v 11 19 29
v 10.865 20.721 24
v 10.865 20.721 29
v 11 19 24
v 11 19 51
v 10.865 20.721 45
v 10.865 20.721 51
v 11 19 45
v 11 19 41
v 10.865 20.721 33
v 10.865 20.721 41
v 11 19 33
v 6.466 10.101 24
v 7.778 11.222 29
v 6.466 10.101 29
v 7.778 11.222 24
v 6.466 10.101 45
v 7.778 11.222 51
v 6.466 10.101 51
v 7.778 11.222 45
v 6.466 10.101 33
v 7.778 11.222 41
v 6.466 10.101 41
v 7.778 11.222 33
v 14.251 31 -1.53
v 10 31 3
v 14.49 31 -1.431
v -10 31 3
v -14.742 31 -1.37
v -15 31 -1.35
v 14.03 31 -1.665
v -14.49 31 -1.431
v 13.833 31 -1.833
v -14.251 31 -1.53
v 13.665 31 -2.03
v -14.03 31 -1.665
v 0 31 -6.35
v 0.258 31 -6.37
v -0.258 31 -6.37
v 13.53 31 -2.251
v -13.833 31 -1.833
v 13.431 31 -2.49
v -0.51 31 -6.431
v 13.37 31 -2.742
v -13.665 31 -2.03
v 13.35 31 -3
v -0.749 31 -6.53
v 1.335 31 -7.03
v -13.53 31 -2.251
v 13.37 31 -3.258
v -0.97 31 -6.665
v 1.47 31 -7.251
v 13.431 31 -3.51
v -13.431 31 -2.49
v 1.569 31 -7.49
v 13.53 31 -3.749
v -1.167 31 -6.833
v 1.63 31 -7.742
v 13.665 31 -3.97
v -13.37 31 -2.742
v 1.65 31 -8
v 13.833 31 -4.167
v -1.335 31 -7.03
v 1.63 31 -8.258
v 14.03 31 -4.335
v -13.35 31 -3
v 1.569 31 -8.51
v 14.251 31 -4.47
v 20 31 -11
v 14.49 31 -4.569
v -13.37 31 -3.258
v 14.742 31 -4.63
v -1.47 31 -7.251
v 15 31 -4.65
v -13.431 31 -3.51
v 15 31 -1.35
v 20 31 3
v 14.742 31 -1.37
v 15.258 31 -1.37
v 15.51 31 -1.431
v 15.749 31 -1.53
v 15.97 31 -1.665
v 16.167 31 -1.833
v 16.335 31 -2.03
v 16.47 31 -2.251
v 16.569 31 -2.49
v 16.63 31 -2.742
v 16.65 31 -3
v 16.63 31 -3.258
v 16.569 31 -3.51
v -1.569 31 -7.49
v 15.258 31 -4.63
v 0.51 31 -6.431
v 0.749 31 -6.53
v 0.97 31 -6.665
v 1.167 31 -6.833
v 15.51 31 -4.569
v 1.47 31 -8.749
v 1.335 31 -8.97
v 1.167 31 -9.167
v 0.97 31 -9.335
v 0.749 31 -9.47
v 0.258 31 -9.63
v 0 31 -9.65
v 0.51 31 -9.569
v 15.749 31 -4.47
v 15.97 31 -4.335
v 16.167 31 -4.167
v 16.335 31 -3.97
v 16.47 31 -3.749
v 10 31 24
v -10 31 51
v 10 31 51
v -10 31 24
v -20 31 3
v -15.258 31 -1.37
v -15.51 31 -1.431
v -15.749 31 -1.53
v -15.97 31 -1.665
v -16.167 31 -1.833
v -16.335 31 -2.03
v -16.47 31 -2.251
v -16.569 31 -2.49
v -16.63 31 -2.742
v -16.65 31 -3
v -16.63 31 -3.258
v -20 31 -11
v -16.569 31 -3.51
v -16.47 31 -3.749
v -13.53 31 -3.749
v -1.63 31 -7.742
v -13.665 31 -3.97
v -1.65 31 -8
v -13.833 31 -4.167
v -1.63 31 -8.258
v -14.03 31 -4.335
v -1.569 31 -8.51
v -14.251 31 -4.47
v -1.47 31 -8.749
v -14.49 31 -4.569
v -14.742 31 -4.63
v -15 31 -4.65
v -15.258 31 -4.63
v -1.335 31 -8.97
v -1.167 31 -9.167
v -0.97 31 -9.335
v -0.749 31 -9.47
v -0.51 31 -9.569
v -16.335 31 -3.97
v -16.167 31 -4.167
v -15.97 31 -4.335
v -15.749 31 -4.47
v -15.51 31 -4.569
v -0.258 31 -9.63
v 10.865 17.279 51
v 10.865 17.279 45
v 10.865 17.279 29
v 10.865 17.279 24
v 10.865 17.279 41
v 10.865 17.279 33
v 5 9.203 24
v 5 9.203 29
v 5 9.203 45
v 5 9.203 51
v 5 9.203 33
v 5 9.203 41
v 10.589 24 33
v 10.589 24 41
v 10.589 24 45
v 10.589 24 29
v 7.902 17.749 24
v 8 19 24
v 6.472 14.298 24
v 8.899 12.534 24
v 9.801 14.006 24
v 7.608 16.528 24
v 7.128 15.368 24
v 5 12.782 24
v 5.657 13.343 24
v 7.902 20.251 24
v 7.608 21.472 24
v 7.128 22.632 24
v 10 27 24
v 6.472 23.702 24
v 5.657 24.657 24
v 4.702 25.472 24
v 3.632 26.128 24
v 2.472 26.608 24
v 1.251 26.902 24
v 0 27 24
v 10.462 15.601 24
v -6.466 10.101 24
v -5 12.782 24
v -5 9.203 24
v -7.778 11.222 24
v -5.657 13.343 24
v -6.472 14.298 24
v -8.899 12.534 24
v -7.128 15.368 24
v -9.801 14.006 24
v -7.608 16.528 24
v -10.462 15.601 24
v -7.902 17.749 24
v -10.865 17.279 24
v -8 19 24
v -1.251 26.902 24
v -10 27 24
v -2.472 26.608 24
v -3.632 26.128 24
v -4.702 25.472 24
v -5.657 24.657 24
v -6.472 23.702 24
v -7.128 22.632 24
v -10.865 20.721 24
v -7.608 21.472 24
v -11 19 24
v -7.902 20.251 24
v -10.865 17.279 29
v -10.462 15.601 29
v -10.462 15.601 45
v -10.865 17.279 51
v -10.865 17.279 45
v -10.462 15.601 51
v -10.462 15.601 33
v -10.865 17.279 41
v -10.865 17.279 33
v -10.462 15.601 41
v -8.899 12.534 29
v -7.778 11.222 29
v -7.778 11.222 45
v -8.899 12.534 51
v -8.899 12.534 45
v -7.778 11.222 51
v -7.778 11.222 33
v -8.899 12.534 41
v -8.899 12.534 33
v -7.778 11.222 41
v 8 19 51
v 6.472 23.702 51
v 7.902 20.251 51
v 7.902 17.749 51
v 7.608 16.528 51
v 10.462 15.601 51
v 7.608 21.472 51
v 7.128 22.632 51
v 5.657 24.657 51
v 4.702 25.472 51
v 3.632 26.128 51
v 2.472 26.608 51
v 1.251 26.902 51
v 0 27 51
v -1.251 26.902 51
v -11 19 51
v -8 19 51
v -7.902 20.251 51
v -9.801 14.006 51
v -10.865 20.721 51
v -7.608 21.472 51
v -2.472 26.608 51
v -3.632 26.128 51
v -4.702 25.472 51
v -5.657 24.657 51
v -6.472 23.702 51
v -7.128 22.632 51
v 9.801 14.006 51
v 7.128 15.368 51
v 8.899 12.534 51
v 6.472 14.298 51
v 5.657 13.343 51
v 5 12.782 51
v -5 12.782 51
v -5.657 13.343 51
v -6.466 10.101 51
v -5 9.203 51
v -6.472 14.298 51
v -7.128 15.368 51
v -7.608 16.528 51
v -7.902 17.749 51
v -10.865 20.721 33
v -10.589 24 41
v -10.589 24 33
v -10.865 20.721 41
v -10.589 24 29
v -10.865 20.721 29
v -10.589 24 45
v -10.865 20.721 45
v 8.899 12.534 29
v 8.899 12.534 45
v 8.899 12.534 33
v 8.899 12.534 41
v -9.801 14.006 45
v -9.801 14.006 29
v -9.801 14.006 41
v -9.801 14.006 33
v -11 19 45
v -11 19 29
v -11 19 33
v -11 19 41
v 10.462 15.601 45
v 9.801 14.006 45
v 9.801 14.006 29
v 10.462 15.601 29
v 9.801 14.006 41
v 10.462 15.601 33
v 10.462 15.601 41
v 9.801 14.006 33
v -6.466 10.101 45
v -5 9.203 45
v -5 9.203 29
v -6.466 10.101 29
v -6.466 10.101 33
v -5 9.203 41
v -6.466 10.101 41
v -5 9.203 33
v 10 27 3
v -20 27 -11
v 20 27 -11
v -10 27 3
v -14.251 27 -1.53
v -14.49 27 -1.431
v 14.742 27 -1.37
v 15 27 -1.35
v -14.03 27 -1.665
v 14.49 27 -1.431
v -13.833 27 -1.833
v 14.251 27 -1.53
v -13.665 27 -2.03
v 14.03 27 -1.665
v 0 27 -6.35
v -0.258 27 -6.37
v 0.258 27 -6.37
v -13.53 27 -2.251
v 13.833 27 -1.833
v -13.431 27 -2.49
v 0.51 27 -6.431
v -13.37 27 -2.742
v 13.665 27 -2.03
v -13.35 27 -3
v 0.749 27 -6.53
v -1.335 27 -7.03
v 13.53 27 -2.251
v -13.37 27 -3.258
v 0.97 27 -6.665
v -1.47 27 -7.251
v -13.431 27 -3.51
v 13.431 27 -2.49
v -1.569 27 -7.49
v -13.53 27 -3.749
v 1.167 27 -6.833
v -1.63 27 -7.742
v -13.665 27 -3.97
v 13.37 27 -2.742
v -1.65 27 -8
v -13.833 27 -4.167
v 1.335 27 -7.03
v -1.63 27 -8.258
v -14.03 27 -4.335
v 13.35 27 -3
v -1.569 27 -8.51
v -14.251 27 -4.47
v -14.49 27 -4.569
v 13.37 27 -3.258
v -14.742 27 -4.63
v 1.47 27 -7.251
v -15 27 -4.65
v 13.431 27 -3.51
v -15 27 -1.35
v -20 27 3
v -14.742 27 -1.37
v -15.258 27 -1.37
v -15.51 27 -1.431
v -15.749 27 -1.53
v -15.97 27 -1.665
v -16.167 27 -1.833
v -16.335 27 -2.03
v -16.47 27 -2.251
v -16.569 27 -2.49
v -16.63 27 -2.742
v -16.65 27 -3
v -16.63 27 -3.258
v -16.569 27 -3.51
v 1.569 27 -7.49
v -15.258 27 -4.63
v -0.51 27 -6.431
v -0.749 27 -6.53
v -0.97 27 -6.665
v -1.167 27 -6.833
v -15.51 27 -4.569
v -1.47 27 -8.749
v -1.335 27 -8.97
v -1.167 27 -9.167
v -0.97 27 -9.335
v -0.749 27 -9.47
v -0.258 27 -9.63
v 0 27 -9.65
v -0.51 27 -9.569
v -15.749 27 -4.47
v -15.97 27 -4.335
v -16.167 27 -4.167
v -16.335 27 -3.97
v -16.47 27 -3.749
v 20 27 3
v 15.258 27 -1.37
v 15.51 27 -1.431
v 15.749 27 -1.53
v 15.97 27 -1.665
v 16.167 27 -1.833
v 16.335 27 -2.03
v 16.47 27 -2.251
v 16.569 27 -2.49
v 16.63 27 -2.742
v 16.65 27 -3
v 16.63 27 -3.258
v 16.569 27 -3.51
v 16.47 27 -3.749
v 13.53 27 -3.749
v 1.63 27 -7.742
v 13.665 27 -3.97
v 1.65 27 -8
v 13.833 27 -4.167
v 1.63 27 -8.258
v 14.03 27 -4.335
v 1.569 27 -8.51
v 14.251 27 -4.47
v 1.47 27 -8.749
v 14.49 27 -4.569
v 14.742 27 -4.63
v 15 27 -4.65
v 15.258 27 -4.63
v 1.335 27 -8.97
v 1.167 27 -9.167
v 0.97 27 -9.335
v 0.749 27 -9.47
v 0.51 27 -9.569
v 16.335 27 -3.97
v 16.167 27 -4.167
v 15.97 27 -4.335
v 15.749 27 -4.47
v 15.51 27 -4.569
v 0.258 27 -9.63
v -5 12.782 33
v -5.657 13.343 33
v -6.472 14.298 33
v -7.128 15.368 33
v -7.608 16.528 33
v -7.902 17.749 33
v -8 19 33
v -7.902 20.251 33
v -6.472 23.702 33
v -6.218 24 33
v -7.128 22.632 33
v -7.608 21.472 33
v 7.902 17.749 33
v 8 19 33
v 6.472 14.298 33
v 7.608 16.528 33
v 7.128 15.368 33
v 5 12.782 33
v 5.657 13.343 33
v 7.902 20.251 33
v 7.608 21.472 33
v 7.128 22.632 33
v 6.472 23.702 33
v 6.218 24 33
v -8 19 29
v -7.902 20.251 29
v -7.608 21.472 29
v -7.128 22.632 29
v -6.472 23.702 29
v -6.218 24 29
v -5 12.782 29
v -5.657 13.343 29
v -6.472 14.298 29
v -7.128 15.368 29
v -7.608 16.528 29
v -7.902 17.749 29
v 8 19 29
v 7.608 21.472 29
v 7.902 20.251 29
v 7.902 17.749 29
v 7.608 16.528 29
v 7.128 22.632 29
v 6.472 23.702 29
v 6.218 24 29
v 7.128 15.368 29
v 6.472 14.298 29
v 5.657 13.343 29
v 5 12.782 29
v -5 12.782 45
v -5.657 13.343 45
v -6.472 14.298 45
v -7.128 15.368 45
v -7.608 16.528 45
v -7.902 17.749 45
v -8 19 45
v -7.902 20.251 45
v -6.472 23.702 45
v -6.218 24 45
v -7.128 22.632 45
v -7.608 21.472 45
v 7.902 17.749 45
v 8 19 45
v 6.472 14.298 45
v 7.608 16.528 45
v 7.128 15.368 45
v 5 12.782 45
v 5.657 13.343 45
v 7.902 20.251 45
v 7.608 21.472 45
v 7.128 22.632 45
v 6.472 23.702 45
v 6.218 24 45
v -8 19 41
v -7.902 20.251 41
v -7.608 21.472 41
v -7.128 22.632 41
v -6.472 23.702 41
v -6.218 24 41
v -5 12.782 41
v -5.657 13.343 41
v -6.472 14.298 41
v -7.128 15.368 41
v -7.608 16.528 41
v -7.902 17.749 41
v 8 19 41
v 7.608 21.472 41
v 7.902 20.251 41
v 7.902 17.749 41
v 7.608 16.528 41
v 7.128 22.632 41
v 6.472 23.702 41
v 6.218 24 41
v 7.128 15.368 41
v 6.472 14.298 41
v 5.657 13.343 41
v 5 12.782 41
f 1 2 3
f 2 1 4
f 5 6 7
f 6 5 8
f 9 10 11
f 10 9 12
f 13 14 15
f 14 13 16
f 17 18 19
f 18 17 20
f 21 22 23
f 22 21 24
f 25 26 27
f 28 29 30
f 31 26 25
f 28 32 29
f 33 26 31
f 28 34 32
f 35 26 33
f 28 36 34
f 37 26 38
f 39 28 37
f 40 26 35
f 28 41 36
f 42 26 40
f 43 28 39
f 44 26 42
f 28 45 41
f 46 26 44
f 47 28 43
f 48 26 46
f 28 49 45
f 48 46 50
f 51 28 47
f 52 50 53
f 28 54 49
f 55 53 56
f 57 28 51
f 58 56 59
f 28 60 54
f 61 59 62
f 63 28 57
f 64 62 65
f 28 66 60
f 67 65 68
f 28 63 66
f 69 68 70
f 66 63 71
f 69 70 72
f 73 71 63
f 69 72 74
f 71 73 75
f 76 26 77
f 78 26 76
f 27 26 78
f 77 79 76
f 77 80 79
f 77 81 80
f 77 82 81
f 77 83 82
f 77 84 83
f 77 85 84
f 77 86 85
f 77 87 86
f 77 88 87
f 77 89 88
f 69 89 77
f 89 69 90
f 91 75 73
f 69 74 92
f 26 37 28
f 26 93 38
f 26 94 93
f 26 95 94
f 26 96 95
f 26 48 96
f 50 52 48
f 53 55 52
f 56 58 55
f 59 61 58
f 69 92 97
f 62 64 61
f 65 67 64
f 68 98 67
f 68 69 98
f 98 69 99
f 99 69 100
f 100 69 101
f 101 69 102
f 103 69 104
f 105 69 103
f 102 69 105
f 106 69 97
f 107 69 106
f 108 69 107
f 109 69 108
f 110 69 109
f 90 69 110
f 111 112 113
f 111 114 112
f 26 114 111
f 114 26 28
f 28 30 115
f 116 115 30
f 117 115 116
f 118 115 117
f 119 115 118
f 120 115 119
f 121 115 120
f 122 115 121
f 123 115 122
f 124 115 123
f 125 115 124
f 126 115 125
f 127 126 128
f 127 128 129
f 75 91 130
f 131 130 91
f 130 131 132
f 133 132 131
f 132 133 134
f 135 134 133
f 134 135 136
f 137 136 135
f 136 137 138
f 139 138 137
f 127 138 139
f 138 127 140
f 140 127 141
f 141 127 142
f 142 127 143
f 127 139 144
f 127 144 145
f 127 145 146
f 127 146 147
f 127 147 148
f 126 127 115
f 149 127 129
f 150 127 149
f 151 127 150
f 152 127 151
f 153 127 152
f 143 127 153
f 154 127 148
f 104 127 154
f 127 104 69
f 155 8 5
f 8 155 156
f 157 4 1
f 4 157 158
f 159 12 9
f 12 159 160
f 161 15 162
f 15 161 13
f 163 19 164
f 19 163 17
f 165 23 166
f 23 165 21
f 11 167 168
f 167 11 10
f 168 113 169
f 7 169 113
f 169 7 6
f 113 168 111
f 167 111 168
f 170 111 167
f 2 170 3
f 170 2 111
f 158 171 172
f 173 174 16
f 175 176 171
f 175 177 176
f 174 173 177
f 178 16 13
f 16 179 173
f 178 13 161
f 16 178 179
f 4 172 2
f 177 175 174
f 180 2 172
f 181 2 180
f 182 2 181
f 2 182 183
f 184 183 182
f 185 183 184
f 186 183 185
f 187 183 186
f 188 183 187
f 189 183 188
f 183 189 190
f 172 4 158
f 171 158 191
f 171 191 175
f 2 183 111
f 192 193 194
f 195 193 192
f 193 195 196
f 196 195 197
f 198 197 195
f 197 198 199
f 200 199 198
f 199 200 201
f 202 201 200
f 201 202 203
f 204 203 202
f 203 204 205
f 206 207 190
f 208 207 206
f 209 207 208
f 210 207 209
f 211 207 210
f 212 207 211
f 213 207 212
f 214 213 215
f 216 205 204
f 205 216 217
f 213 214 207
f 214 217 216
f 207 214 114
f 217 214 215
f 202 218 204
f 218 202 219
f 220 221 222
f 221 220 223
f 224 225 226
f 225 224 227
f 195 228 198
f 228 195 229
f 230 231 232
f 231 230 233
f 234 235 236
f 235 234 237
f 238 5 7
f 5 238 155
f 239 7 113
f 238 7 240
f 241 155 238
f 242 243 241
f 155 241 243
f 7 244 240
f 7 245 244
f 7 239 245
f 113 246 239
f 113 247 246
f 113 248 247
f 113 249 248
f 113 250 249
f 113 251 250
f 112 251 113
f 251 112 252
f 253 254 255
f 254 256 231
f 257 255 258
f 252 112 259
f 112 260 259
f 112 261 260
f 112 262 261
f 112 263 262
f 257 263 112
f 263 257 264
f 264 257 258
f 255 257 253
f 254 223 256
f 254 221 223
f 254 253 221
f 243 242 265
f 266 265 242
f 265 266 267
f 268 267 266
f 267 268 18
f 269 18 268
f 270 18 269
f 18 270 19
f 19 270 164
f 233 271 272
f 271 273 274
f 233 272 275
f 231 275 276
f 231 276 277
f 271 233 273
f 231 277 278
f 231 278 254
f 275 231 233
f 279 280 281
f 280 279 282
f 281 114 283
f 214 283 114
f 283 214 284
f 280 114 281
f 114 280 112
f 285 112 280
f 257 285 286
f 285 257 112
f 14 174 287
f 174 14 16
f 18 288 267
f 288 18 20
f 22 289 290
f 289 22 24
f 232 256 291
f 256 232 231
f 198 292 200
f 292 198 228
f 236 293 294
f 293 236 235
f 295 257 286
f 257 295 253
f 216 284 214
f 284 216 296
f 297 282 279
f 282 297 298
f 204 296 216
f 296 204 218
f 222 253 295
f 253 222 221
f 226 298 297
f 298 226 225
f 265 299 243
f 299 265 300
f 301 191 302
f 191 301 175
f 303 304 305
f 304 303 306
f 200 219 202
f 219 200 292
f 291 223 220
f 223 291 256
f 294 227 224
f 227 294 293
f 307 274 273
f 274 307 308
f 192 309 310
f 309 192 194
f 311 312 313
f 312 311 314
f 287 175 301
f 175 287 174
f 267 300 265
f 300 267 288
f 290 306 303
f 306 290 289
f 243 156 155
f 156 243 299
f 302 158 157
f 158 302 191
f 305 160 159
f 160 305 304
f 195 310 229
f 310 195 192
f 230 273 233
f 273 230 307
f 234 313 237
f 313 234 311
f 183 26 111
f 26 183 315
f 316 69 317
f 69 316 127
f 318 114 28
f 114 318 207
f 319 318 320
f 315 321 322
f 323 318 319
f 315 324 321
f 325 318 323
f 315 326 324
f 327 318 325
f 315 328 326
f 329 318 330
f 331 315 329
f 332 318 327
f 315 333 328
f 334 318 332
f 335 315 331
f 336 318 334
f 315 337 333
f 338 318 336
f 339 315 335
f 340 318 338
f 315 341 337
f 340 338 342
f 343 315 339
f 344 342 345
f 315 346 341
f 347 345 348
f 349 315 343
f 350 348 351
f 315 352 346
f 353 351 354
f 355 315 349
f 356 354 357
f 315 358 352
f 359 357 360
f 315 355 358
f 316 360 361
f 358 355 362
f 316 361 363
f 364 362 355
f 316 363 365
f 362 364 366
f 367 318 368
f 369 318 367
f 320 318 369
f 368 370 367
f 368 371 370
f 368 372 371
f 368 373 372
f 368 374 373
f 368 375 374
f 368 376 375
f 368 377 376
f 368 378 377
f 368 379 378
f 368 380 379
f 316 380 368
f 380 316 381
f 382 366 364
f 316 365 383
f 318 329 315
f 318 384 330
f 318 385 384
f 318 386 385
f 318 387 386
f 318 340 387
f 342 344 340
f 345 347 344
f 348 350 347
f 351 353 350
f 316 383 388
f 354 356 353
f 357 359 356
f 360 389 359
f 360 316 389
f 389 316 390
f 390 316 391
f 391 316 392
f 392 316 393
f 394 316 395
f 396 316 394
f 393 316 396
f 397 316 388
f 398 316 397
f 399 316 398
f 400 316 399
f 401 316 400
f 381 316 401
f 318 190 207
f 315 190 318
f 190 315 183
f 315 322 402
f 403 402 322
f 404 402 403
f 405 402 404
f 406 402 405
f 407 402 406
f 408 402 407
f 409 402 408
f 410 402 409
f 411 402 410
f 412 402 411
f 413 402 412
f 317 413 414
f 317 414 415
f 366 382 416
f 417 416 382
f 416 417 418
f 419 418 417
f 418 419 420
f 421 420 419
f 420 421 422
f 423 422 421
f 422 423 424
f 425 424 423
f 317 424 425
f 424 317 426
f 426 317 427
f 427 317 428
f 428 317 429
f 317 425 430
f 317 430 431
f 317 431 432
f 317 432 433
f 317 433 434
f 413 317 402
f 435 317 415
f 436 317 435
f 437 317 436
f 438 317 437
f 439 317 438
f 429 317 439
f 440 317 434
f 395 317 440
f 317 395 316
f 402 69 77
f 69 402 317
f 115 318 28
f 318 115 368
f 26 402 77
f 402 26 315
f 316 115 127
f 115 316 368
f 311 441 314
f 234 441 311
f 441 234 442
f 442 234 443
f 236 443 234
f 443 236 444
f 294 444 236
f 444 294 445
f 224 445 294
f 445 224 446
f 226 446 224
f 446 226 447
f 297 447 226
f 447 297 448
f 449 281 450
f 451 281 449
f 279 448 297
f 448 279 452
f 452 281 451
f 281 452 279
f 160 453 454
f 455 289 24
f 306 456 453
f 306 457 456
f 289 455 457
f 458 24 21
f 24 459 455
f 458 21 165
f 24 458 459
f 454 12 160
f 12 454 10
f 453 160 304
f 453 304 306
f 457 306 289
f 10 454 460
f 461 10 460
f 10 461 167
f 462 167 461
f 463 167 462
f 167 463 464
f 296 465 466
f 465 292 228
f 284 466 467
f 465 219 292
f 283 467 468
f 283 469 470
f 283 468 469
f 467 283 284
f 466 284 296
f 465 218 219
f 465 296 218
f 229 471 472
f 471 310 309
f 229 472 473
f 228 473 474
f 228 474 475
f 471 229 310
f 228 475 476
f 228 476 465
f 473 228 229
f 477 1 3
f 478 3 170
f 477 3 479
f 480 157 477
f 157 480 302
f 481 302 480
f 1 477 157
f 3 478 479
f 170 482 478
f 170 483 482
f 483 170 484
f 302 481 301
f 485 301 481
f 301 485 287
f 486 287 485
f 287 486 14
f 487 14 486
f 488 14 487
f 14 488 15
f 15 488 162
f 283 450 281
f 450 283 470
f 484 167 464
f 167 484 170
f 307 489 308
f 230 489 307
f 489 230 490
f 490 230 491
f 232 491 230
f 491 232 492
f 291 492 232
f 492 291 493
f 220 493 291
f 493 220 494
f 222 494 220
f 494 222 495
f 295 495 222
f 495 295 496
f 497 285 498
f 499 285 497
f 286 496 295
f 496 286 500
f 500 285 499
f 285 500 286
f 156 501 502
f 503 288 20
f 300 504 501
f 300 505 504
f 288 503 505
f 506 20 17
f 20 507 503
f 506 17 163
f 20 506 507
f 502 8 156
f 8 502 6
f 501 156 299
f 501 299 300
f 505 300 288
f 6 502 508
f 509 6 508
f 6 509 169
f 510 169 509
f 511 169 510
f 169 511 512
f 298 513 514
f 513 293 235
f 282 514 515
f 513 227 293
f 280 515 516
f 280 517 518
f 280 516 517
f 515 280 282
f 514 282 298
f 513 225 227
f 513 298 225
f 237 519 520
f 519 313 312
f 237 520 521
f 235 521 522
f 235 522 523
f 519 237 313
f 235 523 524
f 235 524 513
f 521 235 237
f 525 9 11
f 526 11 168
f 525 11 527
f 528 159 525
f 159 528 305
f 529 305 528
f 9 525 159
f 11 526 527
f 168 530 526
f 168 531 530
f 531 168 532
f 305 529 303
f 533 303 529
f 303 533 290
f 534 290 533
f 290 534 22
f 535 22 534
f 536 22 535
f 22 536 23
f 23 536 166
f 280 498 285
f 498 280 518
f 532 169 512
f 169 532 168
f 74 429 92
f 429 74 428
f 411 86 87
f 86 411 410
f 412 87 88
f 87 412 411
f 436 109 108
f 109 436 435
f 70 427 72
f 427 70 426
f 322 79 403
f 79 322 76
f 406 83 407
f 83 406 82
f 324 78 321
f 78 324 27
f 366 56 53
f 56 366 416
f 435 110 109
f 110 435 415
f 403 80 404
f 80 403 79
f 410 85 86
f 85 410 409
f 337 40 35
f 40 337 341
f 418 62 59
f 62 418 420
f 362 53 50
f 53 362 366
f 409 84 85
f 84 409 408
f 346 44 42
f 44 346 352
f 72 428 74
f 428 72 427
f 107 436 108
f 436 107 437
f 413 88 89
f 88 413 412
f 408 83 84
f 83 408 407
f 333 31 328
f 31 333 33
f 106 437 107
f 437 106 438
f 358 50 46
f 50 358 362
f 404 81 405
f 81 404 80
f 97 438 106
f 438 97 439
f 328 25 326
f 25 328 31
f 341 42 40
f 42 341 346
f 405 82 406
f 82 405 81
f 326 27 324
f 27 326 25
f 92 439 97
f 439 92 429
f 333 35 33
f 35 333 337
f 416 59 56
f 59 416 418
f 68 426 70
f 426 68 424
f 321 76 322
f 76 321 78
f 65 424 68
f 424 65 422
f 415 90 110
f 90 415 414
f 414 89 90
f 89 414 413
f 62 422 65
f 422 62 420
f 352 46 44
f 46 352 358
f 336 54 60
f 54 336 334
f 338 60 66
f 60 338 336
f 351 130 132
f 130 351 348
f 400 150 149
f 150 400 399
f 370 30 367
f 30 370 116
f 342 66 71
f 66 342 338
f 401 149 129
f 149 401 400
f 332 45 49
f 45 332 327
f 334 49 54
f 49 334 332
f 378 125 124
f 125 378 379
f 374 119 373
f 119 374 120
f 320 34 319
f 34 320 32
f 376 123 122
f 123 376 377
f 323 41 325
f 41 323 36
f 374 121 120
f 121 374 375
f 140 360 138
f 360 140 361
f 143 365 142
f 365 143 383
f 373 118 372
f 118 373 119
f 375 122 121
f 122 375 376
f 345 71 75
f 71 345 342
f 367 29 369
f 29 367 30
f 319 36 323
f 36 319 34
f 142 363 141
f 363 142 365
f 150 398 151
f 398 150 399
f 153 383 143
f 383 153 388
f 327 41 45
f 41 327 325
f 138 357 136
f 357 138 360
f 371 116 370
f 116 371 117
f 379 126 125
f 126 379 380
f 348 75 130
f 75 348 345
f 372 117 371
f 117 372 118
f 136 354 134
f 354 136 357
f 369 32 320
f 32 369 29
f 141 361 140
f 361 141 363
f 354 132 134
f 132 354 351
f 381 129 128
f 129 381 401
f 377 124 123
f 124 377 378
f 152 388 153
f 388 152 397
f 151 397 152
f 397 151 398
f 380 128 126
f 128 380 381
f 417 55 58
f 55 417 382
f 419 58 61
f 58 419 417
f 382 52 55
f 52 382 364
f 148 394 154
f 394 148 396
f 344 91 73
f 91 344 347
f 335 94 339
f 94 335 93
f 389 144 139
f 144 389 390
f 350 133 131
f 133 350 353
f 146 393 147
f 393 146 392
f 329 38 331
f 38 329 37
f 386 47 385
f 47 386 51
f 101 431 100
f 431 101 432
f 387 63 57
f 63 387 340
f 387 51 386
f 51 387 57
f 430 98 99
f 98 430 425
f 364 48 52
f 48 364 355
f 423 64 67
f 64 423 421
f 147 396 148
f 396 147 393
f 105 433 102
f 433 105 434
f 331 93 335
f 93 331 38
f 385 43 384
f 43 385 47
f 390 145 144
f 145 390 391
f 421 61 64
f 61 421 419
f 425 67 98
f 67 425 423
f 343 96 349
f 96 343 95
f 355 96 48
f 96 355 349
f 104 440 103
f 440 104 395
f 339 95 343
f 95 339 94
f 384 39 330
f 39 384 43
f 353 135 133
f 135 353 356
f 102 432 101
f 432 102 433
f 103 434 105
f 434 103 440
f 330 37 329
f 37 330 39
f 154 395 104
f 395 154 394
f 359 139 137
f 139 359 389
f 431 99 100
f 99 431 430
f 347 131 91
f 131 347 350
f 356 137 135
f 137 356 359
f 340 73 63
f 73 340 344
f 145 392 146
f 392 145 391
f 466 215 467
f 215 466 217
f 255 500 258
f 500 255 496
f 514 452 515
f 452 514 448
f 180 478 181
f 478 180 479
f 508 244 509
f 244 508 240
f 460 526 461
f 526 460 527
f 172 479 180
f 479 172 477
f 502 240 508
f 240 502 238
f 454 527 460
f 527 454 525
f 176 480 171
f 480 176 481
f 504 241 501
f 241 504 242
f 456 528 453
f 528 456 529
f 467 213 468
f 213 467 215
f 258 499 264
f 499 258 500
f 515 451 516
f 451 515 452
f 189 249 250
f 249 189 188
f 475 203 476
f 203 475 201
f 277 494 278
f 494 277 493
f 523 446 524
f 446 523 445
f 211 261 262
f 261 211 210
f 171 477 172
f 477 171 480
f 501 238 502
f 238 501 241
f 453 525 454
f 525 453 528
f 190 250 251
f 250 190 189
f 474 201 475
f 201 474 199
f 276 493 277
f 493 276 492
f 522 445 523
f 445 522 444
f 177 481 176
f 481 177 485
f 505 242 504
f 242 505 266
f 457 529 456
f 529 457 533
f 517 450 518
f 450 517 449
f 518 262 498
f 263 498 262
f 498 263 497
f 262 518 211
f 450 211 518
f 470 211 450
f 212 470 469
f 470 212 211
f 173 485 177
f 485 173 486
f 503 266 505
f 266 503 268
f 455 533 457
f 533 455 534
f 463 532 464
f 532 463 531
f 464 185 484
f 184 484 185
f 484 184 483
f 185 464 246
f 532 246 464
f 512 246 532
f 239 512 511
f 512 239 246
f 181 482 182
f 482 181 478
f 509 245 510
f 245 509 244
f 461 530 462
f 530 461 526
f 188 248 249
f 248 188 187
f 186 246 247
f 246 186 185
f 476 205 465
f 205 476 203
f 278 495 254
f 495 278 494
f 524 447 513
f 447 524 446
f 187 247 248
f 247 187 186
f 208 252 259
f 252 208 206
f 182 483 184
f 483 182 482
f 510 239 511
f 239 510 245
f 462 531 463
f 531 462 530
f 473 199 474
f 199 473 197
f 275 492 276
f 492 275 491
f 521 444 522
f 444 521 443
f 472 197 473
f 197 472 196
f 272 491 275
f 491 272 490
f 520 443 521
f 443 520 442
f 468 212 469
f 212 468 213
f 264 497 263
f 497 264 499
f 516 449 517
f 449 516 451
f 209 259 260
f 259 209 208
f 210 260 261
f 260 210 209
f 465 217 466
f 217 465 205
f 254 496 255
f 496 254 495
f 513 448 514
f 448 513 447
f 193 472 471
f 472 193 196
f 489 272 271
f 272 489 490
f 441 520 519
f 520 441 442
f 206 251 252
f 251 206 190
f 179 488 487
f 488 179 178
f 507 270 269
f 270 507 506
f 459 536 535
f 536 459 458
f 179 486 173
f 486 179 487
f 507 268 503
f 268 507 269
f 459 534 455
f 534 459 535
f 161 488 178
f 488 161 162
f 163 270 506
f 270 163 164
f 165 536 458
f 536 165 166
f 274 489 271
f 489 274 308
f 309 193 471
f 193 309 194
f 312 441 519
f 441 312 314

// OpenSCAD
/*
    Sorry this is quite a bit of a mess, and is carried over from a prior design
*/

// Belt Offsets as calculated from the center of X MGN12 block
EVAFrontBeltY = 15.5;

// Center of the belt offset as calculated from the center top of the MGN12 block
EVAFrontUpperBeltZ = -18;
EVAFrontLowerBeltZ = -30;

// Center of the belt offset as calculated from the center top of the MGN12 block
EVAFrontUpperBeltX = 17;
EVAFrontLowerBeltX = -26;

// Belt Offsets as calculated from the X block
EVABackBeltY = -16.5;

EVABackLowerBeltZ = -30;
EVABackUpperBeltZ = -18;

EVABackLowerBeltX = 20;
EVABackUpperBeltX = -27;

module bl_touch_mount_holes(){
	translate([0,-38-9.2,-17]){
		for(x=[0,35.4]){
			translate([0,34,x]) rotate([0,90,0]) cylinder(r=3.5/2,h=100,center=true);
            translate([0,34,0]) rotate([0,90,0]) cylinder(r=6.1/2,h=49,center=true,$fn=6.05);
		}
	}
}

/*

translate([0,0,-38]) rotate([90,0,0]) {
translate([0,16,0]) color("black") cube([100,20,20],center=true);
                   color("red") translate([0,32,0]) cube([100,12,25],center=true);

}*/


module mount() {
    
    difference(){
        union(){
            translate([0,-21,-13]) cylinder(r=10/2,h=21);
            translate([0,0,-38]) rotate([90,0,0]) difference(){
                
                //Main block
                union(){
                    translate([0,1.5,-3.5+1]) cube([58,86+3,42+9],center=true);
                
                    
                    translate([0,1.5,-42/2]) difference(){
                        cube([56,86,7],center=true);
                    }
                }
                
                color("grey") lgx_screw_holes();

                fan_holes(2.5);
                
                // Screw holes for mounts
                for(x=[-25,25]){
                    for(y=[7,-69]){
                        translate([x,35+y,25]) cylinder(r=3.4/2,h=190,center=true);
                        translate([x,35+y,-65]) cylinder(r=6.05/2,h=90,center=true,$fn=6);
                    }
                }
                
                // Screw holes for cable mounts
                for(x=[-15,15]){
                    for(y=[7,-69]){
                        translate([x,35+y,-25]) cylinder(r=2.9/2,h=20,center=true);
                    }
                }
                translate([0,35+7-5,-25]) cylinder(r=2.9/2,h=20,center=true);

                
                // Cut out for the rail and slider
                translate([0,32,0]) cube([100,12,29],center=true);
                translate([0,05,0]) cube([100,53,22],center=true);


                // Cut out for the stepper motor
                translate([0,-23,0]) cube([42,50,43],center=true);
                
                // Cut out for rear stepper cables
                translate([0,-20,-12]) cube([26,64,19],center=true);
                
                // Cut out for rear stepper cables
                translate([0,-20,-22]) cube([15,64,19],center=true);
                
                // Cut out for front handle
                translate([0,-10,20]) cube([42,70,50],center=true);
                
                
                // Mounts for the stepper motor
                bl_touch_mount_holes();
                
                //Slide rail mounts
                for(x=[-10,10]){
                    for(z=[-10,10]){
                        translate([x,40,z]) rotate([90,0,0]) cylinder(r=3.3/2,h=20,center=true);
                    }
                }     
            }
 
           
            translate([EVABackUpperBeltX,-EVABackBeltY,EVABackUpperBeltZ]) translate([11,5.6,0]){
                cube([25,17,14],center=true); 
            }
            translate([EVABackLowerBeltX,-EVABackBeltY,EVABackLowerBeltZ]) translate([1,5.6,0]) {
                cube([25,17,14],center=true);
            }
        }
        
        translate([EVABackUpperBeltX,-EVABackBeltY,EVABackUpperBeltZ]) translate([10,5.6,0]){
            cube([25,14,12],center=true); 
            translate([0,2,0]) rotate([0,90,0]) cylinder(r=5.5/2,h=200,center=true);
        }
        translate([EVABackLowerBeltX,-EVABackBeltY,EVABackLowerBeltZ]) translate([2,5.6,0]) {
            cube([25,14,12],center=true);
            translate([0,2,0]) rotate([0,90,0]) cylinder(r=5.5/2,h=200,center=true);
        }
        
        // Front belt mounts
        translate([EVAFrontLowerBeltX-2.5,-EVAFrontBeltY,EVAFrontLowerBeltZ]) rotate([0,0,-90])  gt2_belt(); 
        
        translate([EVAFrontUpperBeltX+11.5,-EVAFrontBeltY-12,
        EVAFrontUpperBeltZ]) rotate([0,0,90]) gt2_belt();
        
       
      
        translate([EVAFrontLowerBeltX+1,-EVAFrontBeltY,EVAFrontLowerBeltZ]) {
            rotate([90,0,90]) for(z=[-7,7]){
                translate([-4,z,-5]) rotate([0,0,0]) cylinder(r=2.9/2,h=10,center=true);
            }
        }
        
        translate([EVAFrontUpperBeltX+8,-EVAFrontBeltY,EVAFrontUpperBeltZ]) rotate([90,0,90]) {
            
            for(z=[-7,7]){
                translate([-4,z,5]) cylinder(r=2.9/2,h=10,center=true);
            }
        }
        
        mirror([1,0,0]) rotate([90,0,0]) translate([0,-38,0]) fan();
   
     
        //filament tube hole
        translate([0,-21,-14]) cylinder(r=6/2,h=24);
        
        // front duct mount
        translate([0,-17,-76]) rotate([0,90,0]) cylinder(r=3.2/2,h=100,center=true);
        translate([0,-17,-76]) rotate([0,90,0]) cylinder(r=6.1/2,h=49,center=true,$fn=6.05);


    }
    

   
}


module mount_a(){
    intersection(){
        translate([0,-100,0]) cube([200,200,200],center=true);
        mount();
    }
}

module mount_b(){
    intersection(){
        translate([0,100,0]) cube([200,200,200],center=true);
        mount();
    }
}






module cable_mount(){
    translate([0,29,9]){
        difference(){
            union(){
                hull(){
                    translate([0,-10,15]) cylinder(r=22/2,h=27);
                    translate([0,0,28.5]) cube([20,4,27],center=true);
                }
                translate([0,0,11]) cube([20,4,62],center=true);
                translate([0,0,-13]) cube([40,4,14],center=true);

            }
            //translate([0,-13,25]) cylinder(r=16/2,h=50,center=true);
            translate([0,-10,25]) cylinder(r=16/2,h=50,center=true);

            for(z=[0:12:25]){
                translate([0,-17,22+z]) cube([24,24,4],center=true);
            }
            
            translate([0,-17,29]) cube([10,10,40],center=true);

            


        translate([0,0,-12]){
        for(z=[15,-15]){
            translate([z,0,0]) rotate([90,0,0]) cylinder(r=3.3/2,h=560,center=true);
        }   
        translate([0,0,-5]) rotate([90,0,0]) cylinder(r=3.3/2,h=560,center=true);

    }
    }
    }
}



module belt_mount(){
    difference(){
    union(){
      translate([EVAFrontLowerBeltX+1,-EVAFrontBeltY,EVAFrontLowerBeltZ]) translate([-6,-4.5,0]) cube([4,6,20],center=true);
    
    translate([EVAFrontLowerBeltX+1,-EVAFrontBeltY,EVAFrontLowerBeltZ]) translate([-6,-6.5,0]){
            rotate([90,0,90]) for(z=[-7,7]){
                translate([2.5,z,0])  cylinder(r=9/2,h=4,center=true);
            }
        }
    }
    
      translate([EVAFrontLowerBeltX+1,-EVAFrontBeltY,EVAFrontLowerBeltZ]) {
            rotate([90,0,90]) for(z=[-7,7]){
                translate([-4,z,-5]) rotate([0,0,0]) cylinder(r=3.2/2,h=10,center=true);
            }
      }    
    }
     
   /*    
    difference(){
            union(){
                translate([EVAFrontLowerBeltX-2 ,-EVAFrontBeltY-3,EVAFrontLowerBeltZ]) translate([0,-3.4,-3])  cube([6,6,6]);
                translate([EVAFrontLowerBeltX-2 ,-EVAFrontBeltY-3,EVAFrontLowerBeltZ]) translate([0,-4.9,-10])  cube([6,2,20]);
            }
            for(z=[-7,7]){
                %translate([EVAFrontLowerBeltX+1,-EVAFrontBeltY-3,EVAFrontLowerBeltZ+z]) rotate([0,0,0]) cylinder(r=2.9/2,h=1000,center=true);
            }
            translate([EVAFrontLowerBeltX-2,-EVAFrontBeltY+0.2,EVAFrontLowerBeltZ]) gt2_belt(); 
       }*/

        
        
}

module gt2_belt(len=12){
    translate([0,-1.55/2,-3.5]){
        cube([len,1.55-0.75,7]);
        for(r=[0:2:len]){
            translate([r,0,0]) cube([1.0,1.55,7]);
        }   
    }
}

module bl_touch_mount(){
	difference(){
        union(){
            translate([-31,-17.8+0.4,-41/2]){
                cube([2,14,42]);
                translate([-12,0,0]) cube([12,2,42]);
            }
            translate([-35,-17.8+0.4,2]) translate([-3,0,0]) for(z=[9,-9]){
                translate([0,0,z]) rotate([90,0,0])translate([0,0,-6]) cylinder(r=6/2,h=4);
            }
        }
		translate([-3,0,0]) bl_touch();

		for (z=[-2:0.25:3]){
			translate([0,z+3,0]) bl_touch_mount_holes();
		}
	}
}

module bl_touch(){
	translate([-35,-17.8+0.4,2]){ 
		rotate([90,0,0]) cylinder(r=3/2,45.7);
        rotate([90,0,0]) cylinder(r=8/2,36.3);

		rotate([90,0,0]) translate([0,0,-10]) cylinder(r=6/2,h=10);
		for(z=[9,-9]){
			translate([0,0,z]) rotate([90,0,0])translate([0,0,-10]) cylinder(r=3/2,h=10);
		}
	}
	
}

module lgx(){
	   translate([49,-50,-19]) import("models/LGX_Ace_Mosquito.stl");
}

module lgx_screw_holes(){
    translate([49,-50,-19])  {
            translate([0,19.75,26.25]) rotate([0,90,0]) cylinder(r=3.5/2,h=300,center=true);
            translate([0,19.75+17,26.25+11]) rotate([0,90,0]) cylinder(r=3.5/2,h=300,center=true);
    }
}



module airflow_exitfan(d=0){
     translate([5.25,-56,-40.25-3]) cube([20.5,10+d,15.5]);
}



nozzle_x=0;
nozzle_y=-60;
nozzle_z=18;

module airflow_exhaust(d=0,r=62,h=6){
    // translate([-20,-71+d,25]) rotate([0,-30,0]) cube([8,5,20]);
	translate([nozzle_x,nozzle_y,nozzle_z]) rotate([90,0,0]) translate([0,0,d]){ 
			cylinder(r=r/2,h=h,center=true,$fn=20);
	}
}



module airflow(){
        difference(){
            hull(){
                airflow_exitfan(); 
                airflow_exhaust();
            }
			
			airflow_exhaust(r=45,h=100);
			translate([nozzle_x,nozzle_y,nozzle_z+25]) cube([37,20,60],center=true);
					
        }   
}

module airflow_fins(){
	intersection(){
	intersection(){
		intersection(){
			union(){
				 for(x=[-24:6:26]){
					translate([x-2,-55,10]) cube([1.2,20,60],center=true);
				}
			}
			
			translate([0,0,10]) airflow();
			
		}
		translate([0,0,0]) airflow();
	}
	}
}


module duct(){
	
	//airflow_fins();
	
    difference(){
		union(){
		   
			translate([0,-21,-46])  difference(){
				union(){
					translate([4,-35.8,0]) cube([22.5,37,3]);
					cylinder(r=55/2,h=3);
					
					translate([20,20,0]) cylinder(r=12/2,h=3);
					translate([-21,-17,0]) cylinder(r=12/2,h=3);
					
					translate([0,-30,63]) difference(){
						cube([64,10,8],center=true);
						cube([50,10,8],center=true);

					}
					translate([0,-22,63]) difference(){
						cube([64,21,8],center=true);
						cube([58,21,8],center=true);
					}
				}
				cylinder(r=40/2,h=3);
				
			}
			
			
			difference(){
				minkowski(){
					airflow();
					cube([2,2,2],center=true);
				}
			}
			
		}
		fan_holes(4.5);
	
		
		airflow();	
		airflow_exitfan(2);
		
		
		// airflow_exhaust(5,r=52);
		difference(){
			airflow_exhaust(5,r=51);
			airflow_exhaust(5,r=41);
			translate([nozzle_x,nozzle_y,nozzle_z+25]) cube([37,20,60],center=true);
		}
         
        translate([0,-38,17]) rotate([0,90,0]) cylinder(r=3.2/2,h=100,center=true);

    }
}

module fan_holes(r=3.1){
    for(x=[-22,20.5]){
        for(y=[-19,19]){
            translate([x,y-20,-50]) cylinder(r=r/2,h=50);
        }
    }
}


module duct_mount(){
     translate([4,-56,-40.25]) cube([24,14,18]);
     translate([2,-49,-d/2+5]) cube([w,14,6],center=true);
}


module fan(){
    translate([25,-46,-43]) rotate([0,180,0]) import("models/5015_Blower_Fan.stl");
}
 
module tensioner(){
    translate([EVABackLowerBeltX+10,-EVABackBeltY+18,EVABackLowerBeltZ+6])  rotate([180,0,0]) import("rear_eva_9mm_tension_slider.stl");
}
//gt2_belt();


$fn=40;
//mirror([1,0,0]) mount_a();
//mirror([1,0,0]) duct();
//mirror([1,0,0]) mount_b();

//bl_touch_mount();
//belt_mount();

//front_belt_mount();
cable_mount();
//mount();


/*
$fn=40;
rotate([90,0,0]){
	//translate([0,-38,0]) duct();

	translate([0,-38,0]) color("black") fan();
	
	translate([0,-38,0]) color("grey") lgx();
    //translate([0,-38,0]) color("grey") lgx_screw_holes();
    
	translate([0,-41,0])  bl_touch_mount();
    translate([0,-41,0])  bl_touch();

}*/

/*
color("black"){
    
    translate([EVAFrontLowerBeltX-2-30,-EVAFrontBeltY,EVAFrontLowerBeltZ]) gt2_belt(len=40); 
    translate([EVAFrontUpperBeltX-2,-EVAFrontBeltY,EVAFrontUpperBeltZ]) gt2_belt(len=40); 
   
    translate([EVABackLowerBeltX,-EVABackBeltY,EVABackLowerBeltZ]) gt2_belt(len=40);
    translate([EVABackUpperBeltX-30,-EVABackBeltY,EVABackUpperBeltZ]) gt2_belt(len=40);  
}
    

 tensioner();*/
//mount();
//front_belt_mount();
